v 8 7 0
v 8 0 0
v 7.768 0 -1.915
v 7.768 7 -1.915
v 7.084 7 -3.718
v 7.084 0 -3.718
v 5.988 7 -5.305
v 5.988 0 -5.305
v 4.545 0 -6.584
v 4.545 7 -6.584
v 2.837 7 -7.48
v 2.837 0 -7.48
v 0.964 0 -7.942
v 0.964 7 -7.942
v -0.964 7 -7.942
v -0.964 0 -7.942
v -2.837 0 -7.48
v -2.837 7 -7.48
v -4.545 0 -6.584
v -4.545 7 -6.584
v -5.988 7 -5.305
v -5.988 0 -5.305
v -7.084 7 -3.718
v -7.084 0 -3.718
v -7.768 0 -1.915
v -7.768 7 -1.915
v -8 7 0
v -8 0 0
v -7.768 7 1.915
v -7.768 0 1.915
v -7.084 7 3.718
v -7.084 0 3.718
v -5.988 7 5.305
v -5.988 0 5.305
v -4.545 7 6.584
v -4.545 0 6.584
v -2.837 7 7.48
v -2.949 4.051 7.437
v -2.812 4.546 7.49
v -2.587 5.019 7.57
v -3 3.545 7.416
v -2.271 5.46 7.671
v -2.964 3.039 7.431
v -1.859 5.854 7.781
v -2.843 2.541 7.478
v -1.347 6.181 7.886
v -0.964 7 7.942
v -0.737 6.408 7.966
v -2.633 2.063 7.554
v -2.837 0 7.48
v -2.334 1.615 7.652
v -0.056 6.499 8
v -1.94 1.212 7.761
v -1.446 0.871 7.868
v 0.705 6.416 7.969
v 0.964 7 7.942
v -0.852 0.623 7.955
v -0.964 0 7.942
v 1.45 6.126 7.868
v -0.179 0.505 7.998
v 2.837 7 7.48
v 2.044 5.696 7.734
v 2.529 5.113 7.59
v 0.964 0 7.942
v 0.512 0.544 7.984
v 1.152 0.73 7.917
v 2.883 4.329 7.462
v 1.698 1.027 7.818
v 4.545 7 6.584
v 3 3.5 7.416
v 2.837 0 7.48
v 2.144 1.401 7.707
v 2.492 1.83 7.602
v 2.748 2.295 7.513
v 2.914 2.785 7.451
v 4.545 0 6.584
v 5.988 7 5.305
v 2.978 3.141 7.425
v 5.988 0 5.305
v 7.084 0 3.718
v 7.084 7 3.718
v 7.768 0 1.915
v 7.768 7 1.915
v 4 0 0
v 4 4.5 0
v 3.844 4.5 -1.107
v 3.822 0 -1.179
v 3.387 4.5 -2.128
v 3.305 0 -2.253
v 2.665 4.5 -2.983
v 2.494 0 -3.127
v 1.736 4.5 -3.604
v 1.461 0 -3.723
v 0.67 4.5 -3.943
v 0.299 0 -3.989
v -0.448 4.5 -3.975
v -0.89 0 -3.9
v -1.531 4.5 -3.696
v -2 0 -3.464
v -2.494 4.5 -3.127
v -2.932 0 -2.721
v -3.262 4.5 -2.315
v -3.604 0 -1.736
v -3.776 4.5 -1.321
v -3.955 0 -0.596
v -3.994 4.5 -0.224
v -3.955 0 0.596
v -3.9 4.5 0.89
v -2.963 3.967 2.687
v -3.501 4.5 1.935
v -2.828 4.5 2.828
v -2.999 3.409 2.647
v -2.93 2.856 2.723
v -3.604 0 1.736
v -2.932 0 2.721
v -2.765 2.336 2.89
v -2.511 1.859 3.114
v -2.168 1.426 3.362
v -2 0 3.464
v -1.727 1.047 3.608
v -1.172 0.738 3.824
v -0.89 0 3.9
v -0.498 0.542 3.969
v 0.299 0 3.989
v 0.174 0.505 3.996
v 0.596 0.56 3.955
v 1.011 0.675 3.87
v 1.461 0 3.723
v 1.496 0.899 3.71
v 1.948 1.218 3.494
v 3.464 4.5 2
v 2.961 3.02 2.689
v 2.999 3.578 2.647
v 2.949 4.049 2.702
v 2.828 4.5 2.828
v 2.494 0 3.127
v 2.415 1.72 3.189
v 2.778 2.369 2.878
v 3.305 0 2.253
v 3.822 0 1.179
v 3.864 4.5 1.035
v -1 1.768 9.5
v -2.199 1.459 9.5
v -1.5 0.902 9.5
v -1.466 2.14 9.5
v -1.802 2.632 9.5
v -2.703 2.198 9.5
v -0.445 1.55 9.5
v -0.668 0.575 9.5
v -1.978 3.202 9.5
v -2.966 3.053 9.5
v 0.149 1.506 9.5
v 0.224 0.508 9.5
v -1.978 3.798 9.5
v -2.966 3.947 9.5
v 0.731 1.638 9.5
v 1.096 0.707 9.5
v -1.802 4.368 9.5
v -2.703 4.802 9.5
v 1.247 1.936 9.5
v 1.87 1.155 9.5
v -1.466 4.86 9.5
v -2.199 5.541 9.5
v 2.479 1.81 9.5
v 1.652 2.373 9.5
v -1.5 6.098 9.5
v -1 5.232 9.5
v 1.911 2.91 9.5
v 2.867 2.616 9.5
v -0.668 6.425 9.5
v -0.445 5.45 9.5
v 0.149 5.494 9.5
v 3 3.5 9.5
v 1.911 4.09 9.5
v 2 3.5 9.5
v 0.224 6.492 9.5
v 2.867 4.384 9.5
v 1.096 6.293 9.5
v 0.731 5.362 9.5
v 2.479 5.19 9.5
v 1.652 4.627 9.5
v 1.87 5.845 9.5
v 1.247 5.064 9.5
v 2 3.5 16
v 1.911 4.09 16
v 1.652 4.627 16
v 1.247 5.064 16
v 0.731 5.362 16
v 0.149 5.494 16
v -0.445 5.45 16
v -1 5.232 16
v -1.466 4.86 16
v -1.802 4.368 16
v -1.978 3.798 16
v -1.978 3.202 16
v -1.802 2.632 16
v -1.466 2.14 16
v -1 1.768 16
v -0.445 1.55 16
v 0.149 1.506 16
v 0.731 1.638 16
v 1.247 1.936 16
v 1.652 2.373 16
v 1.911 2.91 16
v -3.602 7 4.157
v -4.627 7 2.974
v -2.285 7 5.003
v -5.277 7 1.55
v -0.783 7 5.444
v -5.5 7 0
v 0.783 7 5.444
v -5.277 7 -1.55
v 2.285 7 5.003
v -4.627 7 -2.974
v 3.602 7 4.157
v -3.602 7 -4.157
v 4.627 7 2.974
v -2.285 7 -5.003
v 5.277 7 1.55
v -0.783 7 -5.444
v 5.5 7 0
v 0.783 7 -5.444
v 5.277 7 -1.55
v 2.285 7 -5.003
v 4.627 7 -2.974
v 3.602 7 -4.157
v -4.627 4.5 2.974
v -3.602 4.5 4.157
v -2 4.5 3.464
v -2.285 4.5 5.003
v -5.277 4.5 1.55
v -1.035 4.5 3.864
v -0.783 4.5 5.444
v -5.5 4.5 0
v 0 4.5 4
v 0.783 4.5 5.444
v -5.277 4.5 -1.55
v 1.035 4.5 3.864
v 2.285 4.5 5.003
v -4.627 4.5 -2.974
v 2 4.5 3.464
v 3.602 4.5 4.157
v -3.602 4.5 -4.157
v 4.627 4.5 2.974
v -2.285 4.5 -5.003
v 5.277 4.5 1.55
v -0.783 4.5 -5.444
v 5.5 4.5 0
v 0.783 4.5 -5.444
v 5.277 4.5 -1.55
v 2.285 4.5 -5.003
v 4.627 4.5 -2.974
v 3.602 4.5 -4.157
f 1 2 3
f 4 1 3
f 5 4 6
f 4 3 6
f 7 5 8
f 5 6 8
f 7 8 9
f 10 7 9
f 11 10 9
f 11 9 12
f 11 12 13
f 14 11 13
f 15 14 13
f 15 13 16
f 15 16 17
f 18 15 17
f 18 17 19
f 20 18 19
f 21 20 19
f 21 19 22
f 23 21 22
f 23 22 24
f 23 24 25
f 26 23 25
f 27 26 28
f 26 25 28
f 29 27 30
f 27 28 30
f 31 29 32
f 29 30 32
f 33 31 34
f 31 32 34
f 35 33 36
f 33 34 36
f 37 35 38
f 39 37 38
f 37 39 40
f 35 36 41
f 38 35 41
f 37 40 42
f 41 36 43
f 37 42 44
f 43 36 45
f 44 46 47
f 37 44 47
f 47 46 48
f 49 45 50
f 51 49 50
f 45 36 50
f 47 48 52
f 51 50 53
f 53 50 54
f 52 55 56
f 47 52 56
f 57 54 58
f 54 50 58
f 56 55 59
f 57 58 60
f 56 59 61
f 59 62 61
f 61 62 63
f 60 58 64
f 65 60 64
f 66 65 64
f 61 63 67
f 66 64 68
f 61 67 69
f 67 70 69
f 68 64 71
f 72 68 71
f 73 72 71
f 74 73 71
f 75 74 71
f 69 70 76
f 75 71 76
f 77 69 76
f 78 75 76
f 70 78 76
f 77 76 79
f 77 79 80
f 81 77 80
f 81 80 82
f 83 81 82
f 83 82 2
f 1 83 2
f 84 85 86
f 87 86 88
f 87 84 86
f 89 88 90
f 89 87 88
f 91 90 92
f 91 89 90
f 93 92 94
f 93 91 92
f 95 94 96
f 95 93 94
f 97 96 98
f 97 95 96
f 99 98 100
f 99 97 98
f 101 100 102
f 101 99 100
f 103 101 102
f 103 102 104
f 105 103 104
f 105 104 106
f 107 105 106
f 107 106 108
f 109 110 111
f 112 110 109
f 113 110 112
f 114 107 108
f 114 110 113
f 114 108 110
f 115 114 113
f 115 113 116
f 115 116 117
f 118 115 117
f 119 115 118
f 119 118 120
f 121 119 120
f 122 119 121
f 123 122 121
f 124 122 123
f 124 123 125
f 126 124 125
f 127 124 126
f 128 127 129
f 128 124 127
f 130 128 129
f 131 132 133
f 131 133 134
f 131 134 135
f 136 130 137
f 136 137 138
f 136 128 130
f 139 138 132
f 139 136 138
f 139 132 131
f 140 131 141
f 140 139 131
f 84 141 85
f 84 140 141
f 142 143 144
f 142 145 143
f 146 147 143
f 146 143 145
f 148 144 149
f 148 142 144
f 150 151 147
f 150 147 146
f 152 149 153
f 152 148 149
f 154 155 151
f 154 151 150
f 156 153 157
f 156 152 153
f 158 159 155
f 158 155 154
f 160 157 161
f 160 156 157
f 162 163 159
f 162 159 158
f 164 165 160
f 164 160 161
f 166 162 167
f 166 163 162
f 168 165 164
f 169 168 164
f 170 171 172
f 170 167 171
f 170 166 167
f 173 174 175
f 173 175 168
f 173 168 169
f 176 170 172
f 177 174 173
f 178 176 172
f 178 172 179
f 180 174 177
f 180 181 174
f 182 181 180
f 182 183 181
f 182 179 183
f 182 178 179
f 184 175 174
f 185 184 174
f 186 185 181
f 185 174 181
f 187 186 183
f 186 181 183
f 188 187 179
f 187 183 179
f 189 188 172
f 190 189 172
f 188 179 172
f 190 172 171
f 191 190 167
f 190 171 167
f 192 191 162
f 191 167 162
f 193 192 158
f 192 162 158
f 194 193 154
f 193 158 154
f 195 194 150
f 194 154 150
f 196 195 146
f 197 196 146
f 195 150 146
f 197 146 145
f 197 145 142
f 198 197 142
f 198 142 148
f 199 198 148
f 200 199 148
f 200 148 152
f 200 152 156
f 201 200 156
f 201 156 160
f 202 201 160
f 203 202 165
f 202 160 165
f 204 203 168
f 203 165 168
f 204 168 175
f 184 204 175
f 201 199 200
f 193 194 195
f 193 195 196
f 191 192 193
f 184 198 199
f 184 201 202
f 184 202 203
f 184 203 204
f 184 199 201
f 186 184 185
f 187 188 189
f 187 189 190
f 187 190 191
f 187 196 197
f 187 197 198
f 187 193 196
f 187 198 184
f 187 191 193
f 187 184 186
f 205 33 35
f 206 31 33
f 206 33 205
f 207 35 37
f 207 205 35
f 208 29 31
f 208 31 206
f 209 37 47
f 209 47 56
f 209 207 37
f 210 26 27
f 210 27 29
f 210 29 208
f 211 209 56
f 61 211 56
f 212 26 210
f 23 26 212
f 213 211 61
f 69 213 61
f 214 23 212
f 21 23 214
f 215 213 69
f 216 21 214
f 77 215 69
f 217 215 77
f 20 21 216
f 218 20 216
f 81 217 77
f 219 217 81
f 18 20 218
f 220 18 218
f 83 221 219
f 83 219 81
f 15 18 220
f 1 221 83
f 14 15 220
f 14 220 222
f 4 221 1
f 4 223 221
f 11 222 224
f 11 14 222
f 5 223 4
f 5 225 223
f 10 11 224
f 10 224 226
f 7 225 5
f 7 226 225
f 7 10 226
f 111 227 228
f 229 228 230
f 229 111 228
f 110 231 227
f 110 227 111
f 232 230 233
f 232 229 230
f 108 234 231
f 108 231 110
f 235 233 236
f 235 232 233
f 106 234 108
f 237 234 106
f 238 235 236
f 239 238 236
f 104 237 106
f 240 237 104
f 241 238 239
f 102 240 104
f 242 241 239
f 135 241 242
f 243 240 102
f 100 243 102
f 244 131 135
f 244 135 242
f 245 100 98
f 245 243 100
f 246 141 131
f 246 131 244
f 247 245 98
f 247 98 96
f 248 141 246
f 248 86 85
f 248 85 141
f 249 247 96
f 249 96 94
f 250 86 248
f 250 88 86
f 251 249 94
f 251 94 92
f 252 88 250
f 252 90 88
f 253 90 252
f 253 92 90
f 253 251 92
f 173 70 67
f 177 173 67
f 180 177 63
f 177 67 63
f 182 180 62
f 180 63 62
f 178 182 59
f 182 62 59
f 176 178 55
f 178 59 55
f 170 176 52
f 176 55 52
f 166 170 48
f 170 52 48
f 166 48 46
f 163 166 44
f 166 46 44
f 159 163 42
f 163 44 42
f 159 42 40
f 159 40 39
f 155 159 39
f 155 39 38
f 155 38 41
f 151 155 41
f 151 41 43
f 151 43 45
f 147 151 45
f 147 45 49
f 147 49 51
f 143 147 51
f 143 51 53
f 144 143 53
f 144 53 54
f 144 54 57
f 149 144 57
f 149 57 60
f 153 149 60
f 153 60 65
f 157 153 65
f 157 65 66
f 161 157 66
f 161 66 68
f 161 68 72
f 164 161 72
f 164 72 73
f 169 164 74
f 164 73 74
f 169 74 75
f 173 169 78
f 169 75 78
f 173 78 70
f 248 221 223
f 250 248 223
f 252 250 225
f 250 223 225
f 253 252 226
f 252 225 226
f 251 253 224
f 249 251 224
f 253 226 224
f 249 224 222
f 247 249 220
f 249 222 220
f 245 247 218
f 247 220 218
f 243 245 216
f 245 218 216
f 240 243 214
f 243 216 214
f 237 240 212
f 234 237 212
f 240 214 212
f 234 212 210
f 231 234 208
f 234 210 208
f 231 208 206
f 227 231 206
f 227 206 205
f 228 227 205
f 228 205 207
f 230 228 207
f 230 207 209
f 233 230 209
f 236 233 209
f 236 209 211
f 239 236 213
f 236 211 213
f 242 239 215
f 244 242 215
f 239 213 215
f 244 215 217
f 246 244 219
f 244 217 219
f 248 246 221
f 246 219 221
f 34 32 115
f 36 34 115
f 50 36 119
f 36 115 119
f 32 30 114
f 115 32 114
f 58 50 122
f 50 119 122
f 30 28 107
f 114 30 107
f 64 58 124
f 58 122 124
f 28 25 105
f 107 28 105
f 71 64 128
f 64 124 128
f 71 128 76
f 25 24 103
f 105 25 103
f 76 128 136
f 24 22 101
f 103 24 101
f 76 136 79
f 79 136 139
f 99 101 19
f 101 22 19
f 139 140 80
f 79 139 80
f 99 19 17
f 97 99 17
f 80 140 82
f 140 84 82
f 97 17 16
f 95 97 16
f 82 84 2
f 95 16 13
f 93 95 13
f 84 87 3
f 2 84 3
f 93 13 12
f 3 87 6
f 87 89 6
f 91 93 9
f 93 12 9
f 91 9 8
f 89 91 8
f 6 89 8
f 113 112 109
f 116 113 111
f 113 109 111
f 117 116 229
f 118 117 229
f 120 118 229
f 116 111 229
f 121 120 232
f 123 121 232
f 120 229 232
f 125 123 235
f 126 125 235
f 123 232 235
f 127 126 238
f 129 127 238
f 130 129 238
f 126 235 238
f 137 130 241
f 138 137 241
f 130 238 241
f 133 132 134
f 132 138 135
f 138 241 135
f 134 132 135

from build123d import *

# Parameters (mm, degrees)
SKETCH_1_R          = 8
SKETCH_1_R_2        = 4
EXTRUDE_1_DEPTH     = 7
SKETCH_2_R          = 3
EXTRUDE_2_DEPTH     = 9.5
SKETCH_5_R          = 4
CUT_EXTRUDE_1_DEPTH = 9.5
SKETCH_6_R          = 2
EXTRUDE_3_DEPTH     = 6.5
SKETCH_7_R          = 5.5
CUT_EXTRUDE_2_DEPTH = 2.5


with BuildPart() as part:
    # 草图1 → 凸台-拉伸1 (new body)
    with BuildSketch(Plane(origin=(0, 0, 0), x_dir=(1, 0, 0), z_dir=(0, 1, 0))):
        Circle(SKETCH_1_R)
        Circle(SKETCH_1_R_2, mode=Mode.SUBTRACT)
    extrude(amount=EXTRUDE_1_DEPTH)

    # 草图2 → 凸台-拉伸2 (add)
    with BuildSketch(Plane.XY):
        with Locations((0, 3.5)):
            Circle(SKETCH_2_R)
    extrude(amount=EXTRUDE_2_DEPTH)

    # 草图5 → 切除-拉伸1 (cut)
    with BuildSketch(Plane(origin=(0, 7, 0), x_dir=(1, 0, 0), z_dir=(0, 1, 0))):
        Circle(SKETCH_5_R)
    extrude(amount=-CUT_EXTRUDE_1_DEPTH, mode=Mode.SUBTRACT)

    # 草图6 → 凸台-拉伸3 (add)
    with BuildSketch(Plane.XY.offset(9.5)):
        with Locations((0, 3.5)):
            Circle(SKETCH_6_R)
    extrude(amount=EXTRUDE_3_DEPTH)

    # 草图7 → 切除-拉伸2 (cut)
    with BuildSketch(Plane(origin=(0, 7, 0), x_dir=(1, 0, 0), z_dir=(0, 1, 0))):
        Circle(SKETCH_7_R)
    extrude(amount=-CUT_EXTRUDE_2_DEPTH, mode=Mode.SUBTRACT)


solid = part.part
